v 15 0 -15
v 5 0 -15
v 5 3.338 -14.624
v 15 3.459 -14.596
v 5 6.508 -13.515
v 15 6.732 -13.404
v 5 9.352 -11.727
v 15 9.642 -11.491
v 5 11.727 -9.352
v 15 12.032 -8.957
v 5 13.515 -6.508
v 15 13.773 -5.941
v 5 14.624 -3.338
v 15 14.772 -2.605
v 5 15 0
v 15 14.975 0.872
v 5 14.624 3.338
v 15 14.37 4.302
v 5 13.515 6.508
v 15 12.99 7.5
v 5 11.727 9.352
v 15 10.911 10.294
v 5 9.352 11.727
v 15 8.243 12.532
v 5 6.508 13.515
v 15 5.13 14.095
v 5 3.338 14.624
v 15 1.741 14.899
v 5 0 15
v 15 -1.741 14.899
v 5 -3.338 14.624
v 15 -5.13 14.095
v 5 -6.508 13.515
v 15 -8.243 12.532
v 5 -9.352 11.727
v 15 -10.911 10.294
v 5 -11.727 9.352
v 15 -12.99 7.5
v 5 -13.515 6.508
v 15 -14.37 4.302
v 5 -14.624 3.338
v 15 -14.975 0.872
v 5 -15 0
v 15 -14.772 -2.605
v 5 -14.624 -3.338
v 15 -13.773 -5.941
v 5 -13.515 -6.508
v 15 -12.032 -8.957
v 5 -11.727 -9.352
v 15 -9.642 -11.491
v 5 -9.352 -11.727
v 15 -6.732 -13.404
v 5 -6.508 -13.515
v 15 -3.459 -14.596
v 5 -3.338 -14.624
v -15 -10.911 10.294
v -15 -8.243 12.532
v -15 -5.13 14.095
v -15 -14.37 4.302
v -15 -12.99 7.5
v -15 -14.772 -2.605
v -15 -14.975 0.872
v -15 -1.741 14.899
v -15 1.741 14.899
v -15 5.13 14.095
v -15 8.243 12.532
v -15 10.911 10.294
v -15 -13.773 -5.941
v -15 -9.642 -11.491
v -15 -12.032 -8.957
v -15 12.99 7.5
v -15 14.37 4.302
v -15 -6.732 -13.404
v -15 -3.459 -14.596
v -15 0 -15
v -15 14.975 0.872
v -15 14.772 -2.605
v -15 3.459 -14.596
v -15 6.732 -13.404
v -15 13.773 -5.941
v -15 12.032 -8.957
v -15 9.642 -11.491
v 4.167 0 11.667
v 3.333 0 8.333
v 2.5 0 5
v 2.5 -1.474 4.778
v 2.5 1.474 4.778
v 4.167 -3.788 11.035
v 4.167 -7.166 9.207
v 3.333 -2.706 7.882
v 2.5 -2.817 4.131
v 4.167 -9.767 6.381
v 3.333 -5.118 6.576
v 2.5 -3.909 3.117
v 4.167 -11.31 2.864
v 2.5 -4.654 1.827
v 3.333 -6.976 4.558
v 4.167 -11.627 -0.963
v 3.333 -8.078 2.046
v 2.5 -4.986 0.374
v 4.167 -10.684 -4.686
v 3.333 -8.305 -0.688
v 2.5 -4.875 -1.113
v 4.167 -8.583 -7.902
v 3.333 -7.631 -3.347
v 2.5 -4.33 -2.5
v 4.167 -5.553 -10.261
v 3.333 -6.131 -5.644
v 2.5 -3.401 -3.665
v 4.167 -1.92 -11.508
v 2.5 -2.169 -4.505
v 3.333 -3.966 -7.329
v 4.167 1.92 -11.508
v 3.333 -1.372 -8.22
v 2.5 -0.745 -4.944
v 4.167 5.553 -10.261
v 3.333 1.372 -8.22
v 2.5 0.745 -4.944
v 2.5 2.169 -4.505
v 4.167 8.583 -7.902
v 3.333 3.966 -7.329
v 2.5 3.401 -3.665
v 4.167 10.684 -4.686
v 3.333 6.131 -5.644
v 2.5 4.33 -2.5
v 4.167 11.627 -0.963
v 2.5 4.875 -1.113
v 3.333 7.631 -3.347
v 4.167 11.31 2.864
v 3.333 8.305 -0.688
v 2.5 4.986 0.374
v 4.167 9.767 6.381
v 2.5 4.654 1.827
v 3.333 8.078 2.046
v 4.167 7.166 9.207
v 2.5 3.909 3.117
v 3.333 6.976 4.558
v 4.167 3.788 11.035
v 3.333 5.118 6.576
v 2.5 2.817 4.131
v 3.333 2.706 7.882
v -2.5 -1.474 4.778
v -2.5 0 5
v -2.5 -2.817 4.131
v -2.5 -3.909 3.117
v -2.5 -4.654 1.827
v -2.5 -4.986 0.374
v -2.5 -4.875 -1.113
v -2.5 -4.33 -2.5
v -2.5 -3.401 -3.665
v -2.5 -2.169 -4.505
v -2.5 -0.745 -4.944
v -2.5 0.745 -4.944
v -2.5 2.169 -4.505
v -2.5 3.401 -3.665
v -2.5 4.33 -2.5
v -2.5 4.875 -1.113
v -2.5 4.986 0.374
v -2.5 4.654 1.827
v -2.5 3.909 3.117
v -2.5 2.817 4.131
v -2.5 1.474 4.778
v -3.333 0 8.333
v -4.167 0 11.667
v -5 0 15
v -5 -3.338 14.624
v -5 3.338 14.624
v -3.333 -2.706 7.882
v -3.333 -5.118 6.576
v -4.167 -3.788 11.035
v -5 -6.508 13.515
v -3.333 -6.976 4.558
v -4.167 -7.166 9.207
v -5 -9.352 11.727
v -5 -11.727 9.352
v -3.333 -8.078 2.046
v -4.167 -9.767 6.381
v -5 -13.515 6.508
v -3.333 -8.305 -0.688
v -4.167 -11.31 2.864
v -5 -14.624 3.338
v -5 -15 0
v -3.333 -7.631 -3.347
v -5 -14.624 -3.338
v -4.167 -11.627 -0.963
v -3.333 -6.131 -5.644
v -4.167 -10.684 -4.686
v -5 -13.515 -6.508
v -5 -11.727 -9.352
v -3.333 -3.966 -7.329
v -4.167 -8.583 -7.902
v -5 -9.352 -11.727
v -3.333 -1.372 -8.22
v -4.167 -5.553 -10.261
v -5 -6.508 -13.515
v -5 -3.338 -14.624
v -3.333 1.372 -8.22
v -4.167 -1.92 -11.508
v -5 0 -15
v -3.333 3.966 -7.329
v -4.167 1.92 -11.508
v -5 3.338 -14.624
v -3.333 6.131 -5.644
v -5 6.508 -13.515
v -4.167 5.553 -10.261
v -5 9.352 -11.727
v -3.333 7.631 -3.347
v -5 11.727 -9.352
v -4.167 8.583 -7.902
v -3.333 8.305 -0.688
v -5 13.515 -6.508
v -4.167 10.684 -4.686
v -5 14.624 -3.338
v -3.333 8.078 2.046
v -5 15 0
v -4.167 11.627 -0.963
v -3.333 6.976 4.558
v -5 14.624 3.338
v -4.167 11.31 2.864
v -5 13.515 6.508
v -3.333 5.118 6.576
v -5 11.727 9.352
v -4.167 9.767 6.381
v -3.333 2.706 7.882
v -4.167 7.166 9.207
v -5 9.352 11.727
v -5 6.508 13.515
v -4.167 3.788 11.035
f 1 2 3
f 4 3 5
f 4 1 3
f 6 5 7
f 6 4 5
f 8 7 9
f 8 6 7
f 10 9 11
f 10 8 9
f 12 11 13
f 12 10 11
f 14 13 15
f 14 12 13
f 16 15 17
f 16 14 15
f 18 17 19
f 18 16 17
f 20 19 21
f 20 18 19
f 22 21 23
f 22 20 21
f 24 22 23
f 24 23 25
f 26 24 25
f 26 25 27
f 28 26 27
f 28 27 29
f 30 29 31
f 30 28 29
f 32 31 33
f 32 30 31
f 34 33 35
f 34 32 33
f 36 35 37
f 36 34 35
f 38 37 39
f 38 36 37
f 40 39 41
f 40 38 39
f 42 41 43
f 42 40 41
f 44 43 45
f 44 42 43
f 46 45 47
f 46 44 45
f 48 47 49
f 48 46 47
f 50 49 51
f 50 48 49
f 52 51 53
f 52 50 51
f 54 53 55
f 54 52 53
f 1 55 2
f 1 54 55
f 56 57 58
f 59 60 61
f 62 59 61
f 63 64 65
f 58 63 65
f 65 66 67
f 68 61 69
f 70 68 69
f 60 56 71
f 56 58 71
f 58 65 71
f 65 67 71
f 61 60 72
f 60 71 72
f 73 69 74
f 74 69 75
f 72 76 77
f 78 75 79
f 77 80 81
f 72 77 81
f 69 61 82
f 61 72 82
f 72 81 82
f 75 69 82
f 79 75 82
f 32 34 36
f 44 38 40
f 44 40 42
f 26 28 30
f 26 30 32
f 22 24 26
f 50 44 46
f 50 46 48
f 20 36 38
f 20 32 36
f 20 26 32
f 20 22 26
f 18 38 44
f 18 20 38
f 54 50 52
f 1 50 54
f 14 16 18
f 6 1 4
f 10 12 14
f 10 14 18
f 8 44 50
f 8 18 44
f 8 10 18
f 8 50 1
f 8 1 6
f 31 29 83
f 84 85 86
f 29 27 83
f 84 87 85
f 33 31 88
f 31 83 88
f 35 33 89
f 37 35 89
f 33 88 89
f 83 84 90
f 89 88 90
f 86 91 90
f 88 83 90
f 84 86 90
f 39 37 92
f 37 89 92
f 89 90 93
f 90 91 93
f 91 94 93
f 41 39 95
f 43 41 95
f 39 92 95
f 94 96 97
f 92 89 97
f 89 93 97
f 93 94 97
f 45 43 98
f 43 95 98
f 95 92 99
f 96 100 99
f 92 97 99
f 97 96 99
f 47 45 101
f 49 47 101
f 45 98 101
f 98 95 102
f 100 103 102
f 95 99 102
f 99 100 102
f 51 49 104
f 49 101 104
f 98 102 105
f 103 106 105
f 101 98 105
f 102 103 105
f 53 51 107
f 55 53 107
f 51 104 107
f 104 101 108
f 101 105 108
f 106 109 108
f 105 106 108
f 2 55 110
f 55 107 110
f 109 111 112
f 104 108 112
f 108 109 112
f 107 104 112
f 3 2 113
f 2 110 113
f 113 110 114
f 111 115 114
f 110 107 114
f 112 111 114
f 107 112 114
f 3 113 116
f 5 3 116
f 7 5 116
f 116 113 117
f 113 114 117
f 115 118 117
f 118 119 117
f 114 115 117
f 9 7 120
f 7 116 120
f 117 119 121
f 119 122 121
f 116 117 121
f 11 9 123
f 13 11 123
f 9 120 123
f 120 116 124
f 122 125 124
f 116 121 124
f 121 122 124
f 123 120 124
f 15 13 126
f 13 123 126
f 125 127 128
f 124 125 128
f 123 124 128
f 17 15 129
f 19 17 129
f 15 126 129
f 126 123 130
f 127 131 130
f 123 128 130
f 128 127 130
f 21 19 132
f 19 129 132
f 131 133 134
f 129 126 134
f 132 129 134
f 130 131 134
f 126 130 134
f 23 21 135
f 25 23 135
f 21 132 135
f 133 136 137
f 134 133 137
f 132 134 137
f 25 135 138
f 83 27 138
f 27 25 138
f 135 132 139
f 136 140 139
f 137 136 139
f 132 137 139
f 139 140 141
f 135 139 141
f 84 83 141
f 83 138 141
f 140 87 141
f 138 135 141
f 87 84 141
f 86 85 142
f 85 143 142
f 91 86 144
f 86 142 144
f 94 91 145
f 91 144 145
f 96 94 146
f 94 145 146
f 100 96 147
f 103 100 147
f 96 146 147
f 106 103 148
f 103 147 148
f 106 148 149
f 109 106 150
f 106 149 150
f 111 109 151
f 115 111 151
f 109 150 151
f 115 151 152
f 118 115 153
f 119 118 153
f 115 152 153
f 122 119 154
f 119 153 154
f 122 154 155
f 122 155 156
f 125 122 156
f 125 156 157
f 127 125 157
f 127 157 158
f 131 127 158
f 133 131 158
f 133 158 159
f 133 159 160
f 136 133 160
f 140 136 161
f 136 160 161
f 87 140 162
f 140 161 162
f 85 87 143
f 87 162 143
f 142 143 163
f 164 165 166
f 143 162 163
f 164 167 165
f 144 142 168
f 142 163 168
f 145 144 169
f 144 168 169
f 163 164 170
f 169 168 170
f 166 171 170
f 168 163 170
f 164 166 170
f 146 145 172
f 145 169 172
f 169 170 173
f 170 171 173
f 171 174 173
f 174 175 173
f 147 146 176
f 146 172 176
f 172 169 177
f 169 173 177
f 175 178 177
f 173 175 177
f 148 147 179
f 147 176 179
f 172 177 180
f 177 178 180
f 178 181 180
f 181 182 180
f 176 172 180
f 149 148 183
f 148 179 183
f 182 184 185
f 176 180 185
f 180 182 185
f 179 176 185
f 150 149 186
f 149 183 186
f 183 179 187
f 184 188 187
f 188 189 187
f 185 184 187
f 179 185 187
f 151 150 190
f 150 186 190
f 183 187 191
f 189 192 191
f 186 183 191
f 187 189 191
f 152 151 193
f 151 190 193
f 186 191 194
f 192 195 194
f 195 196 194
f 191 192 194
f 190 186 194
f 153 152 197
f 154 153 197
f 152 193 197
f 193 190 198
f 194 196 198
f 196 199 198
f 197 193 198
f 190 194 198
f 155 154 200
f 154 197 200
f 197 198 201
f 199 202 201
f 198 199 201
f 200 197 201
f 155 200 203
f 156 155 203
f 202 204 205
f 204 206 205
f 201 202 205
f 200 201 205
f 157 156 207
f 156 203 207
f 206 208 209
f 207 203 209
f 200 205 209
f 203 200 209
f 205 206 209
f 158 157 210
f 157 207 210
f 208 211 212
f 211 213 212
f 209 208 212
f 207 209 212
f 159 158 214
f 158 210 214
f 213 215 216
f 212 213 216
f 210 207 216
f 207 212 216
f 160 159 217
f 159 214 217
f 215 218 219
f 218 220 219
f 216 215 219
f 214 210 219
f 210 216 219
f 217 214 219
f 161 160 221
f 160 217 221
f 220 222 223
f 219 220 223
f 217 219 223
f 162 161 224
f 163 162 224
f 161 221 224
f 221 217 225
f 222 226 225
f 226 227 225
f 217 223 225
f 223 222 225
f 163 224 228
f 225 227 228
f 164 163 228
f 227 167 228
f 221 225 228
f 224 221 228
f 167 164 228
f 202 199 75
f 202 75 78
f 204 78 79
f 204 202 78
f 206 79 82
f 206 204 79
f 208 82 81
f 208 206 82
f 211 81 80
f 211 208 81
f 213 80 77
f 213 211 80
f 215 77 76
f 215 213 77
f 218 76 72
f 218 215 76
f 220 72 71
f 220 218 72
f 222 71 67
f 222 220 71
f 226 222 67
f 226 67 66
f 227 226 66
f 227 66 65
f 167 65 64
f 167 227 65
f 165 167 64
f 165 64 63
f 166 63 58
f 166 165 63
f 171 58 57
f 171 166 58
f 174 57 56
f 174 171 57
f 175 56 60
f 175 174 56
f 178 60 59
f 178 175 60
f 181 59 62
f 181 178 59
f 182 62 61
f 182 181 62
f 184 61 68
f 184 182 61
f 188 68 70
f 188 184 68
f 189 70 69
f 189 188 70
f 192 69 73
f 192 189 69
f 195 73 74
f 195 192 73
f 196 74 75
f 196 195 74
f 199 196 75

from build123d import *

# Parameters (mm, degrees)
SKETCH1_R           = 15
BOSS_EXTRUDE1_DEPTH = 15


with BuildPart() as part:
    # Sketch1 → Boss-Extrude1 (new, symmetric)
    with BuildSketch(Plane(origin=(0, 0, 0), x_dir=(0, 0, -1), z_dir=(1, 0, 0))):
        Circle(SKETCH1_R)
    extrude(amount=BOSS_EXTRUDE1_DEPTH, both=True)

    # Sketch2 → Cut-Revolve1 (revolve, cut)
    with BuildSketch(Plane.XY, mode=Mode.PRIVATE) as cut_revolve1_sk:
        Polygon((-5, 15), (5, 15), (2.5, 5), (-2.5, 5), align=None)
    revolve(cut_revolve1_sk.sketch.rotate(Axis((0, 0, 0), (1, 0, 0)), 90), axis=Axis((0, 0, 0), (1, 0, 0)), mode=Mode.SUBTRACT)


solid = part.part
